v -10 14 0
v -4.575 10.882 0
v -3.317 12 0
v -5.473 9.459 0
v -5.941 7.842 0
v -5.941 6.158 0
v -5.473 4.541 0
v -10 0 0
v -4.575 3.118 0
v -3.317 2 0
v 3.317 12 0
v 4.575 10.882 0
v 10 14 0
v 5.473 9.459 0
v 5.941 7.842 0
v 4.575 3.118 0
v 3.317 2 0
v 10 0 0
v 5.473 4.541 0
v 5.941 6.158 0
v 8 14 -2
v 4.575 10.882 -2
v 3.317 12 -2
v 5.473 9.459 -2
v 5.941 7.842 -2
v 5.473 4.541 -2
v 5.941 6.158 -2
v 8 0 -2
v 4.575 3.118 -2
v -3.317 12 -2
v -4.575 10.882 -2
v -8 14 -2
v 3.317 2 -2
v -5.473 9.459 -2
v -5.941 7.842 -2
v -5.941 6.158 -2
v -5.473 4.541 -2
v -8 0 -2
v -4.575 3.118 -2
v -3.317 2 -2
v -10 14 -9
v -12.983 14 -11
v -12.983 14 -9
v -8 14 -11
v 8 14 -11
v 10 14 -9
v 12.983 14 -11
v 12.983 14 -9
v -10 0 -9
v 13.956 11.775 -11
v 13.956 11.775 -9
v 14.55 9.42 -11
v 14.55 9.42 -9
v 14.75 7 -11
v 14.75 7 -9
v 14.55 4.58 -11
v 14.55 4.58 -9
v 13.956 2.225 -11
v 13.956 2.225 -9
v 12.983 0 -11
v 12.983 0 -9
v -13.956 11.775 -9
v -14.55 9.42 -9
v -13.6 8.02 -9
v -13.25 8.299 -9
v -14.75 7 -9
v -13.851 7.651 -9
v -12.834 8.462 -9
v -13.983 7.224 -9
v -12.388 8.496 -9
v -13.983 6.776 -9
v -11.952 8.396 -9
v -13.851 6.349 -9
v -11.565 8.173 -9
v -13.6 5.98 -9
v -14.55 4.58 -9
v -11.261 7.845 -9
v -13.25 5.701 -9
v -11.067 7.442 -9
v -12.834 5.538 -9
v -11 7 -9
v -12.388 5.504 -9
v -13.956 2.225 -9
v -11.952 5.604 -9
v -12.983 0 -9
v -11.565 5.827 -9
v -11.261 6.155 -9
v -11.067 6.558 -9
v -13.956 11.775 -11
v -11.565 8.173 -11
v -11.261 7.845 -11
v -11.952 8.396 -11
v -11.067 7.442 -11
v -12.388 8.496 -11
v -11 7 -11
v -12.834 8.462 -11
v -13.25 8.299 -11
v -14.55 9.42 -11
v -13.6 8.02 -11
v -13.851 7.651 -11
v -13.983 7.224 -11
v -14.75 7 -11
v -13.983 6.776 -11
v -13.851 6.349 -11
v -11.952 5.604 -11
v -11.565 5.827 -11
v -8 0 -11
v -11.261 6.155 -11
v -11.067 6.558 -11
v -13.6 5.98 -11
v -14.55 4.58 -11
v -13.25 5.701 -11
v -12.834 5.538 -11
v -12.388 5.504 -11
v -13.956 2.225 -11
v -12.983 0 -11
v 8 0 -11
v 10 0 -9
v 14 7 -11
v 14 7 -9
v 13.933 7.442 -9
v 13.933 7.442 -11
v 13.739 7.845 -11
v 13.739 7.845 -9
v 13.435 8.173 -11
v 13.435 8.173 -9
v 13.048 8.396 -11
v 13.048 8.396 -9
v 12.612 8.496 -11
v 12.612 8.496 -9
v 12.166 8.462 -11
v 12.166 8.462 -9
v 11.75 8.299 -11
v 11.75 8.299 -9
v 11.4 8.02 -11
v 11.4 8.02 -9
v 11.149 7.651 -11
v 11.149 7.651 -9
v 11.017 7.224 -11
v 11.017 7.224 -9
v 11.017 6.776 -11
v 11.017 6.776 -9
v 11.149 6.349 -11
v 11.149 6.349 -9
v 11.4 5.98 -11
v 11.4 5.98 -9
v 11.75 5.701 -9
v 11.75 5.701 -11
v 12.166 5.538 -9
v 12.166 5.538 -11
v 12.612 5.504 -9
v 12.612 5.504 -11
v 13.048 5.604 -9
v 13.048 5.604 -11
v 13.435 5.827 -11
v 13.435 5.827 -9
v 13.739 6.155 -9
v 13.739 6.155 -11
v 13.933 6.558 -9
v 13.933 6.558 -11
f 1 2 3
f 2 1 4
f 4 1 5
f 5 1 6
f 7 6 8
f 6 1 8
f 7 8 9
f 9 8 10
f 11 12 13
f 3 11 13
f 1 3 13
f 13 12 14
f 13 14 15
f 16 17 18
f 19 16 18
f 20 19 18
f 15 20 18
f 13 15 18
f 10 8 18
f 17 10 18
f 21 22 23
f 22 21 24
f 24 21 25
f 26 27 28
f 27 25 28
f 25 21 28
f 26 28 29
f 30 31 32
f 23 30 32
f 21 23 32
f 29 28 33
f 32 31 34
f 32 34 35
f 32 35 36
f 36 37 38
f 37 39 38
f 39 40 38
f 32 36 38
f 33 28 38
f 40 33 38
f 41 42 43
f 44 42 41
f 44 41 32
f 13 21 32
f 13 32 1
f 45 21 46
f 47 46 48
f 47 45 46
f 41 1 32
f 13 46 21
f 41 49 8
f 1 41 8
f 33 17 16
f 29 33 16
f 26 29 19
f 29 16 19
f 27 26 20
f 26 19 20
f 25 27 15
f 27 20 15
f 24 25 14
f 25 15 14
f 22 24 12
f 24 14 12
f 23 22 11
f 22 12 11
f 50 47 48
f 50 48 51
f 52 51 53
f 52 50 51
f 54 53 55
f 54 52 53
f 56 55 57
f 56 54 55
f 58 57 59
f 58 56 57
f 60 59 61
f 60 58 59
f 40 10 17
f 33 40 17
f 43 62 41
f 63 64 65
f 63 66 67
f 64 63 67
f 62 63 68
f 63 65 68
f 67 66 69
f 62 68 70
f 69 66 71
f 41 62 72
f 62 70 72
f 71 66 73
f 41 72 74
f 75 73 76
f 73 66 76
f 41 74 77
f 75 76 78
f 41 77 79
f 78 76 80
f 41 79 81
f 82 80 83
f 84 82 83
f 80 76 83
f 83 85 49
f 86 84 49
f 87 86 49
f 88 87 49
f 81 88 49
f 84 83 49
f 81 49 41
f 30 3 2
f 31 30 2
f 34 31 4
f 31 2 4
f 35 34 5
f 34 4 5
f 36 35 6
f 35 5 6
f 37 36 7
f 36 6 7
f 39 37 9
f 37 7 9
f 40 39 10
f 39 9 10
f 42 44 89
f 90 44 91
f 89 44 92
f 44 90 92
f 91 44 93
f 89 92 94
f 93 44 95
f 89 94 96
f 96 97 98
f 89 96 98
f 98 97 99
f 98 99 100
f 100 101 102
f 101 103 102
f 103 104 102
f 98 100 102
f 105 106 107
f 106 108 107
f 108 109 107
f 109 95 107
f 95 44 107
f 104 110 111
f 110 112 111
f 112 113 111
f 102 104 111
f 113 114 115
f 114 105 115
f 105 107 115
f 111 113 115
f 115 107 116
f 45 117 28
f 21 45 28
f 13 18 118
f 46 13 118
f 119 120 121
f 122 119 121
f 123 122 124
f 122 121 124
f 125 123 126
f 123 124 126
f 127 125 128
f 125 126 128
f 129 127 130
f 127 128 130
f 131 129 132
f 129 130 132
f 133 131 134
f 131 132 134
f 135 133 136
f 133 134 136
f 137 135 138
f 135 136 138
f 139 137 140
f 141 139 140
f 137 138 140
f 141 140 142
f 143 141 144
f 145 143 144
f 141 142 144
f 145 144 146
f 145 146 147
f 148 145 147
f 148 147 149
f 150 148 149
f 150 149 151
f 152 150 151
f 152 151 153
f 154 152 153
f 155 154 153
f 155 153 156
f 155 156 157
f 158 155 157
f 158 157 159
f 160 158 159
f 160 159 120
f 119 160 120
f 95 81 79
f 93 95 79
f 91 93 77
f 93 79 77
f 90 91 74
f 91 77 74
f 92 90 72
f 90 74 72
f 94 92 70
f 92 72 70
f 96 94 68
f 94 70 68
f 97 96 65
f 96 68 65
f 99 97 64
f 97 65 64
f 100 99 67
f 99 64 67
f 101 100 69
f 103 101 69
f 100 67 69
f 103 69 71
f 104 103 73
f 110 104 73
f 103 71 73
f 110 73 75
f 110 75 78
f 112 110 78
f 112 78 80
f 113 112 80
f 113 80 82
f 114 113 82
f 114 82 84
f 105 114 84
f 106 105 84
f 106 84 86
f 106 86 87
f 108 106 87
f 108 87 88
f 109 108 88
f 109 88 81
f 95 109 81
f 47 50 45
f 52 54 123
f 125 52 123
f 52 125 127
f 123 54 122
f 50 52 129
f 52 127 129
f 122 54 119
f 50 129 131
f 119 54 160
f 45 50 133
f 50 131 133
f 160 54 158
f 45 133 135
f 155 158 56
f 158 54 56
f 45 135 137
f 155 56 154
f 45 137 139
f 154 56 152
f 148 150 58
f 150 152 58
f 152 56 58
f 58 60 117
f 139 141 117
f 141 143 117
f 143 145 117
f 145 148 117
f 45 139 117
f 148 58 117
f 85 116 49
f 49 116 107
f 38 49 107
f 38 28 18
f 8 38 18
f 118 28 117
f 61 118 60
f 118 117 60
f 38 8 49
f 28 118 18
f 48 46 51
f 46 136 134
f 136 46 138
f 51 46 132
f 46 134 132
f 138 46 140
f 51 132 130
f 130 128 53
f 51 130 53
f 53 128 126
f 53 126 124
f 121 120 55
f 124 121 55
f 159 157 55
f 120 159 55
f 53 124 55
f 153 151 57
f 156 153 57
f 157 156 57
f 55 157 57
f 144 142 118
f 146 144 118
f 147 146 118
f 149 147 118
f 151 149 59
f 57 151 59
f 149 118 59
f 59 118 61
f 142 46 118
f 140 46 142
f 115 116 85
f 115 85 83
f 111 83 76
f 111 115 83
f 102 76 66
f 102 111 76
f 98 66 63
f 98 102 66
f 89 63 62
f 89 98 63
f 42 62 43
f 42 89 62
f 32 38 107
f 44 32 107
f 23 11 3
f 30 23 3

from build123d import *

# Parameters (mm, degrees)
BOSS_EXTRUDE1_DEPTH = 14
SKETCH3_R           = 1.5
CUT_EXTRUDE1_DEPTH  = 14
CUT_EXTRUDE2_START  = -2
CUT_EXTRUDE2_DEPTH  = 2


# Read off the part's stored shape, not the designer's step: Cut-Extrude2
with BuildPart() as part:
    # Sketch2 → Boss-Extrude1 (new body)
    with BuildSketch(Plane(origin=(0, 0, 0), x_dir=(1, 0, 0), z_dir=(0, 1, 0))):
        Polygon((-10, 0), (10, 0), (10, 9), (15, 9), (15, 11), (8, 11), (8, 2), (-8, 2), (-8, 11), (-15, 11), (-15, 9), (-10, 9), align=None)
    extrude(amount=BOSS_EXTRUDE1_DEPTH)

    # Sketch3 → Cut-Extrude1 (cut)
    with BuildSketch(Plane.XY):
        with Locations((-12.5, 7)):
            Circle(SKETCH3_R)
        with Locations((12.5, 7)):
            Circle(SKETCH3_R)
        with BuildLine():
            Line((-3.31662479, 2), (3.31662479, 2))
            ThreePointArc((3.31662479, 2), (6, 7), (3.31662479, 12))
            Line((3.31662479, 12), (-3.31662479, 12))
            ThreePointArc((-3.31662479, 12), (-6, 7), (-3.31662479, 2))
        make_face()
    extrude(amount=-CUT_EXTRUDE1_DEPTH, mode=Mode.SUBTRACT)

    # Cut-Extrude2 outline → Cut-Extrude2 (cut)
    with BuildSketch(Plane.XY.offset(-9).offset(CUT_EXTRUDE2_START)):
        with BuildLine():
            ThreePointArc((-12.983162173, 0), (-14.75, 7), (-12.983162173, 14))
            Line((-12.983162173, 14), (-15, 14))
            Line((-15, 14), (-15, 0))
            Line((-15, 0), (-12.983162173, 0))
        make_face()
        with BuildLine():
            Line((15, 14), (12.983162173, 14))
            ThreePointArc((12.983162173, 14), (14.75, 7), (12.983162173, 0))
            Line((12.983162173, 0), (15, 0))
            Line((15, 0), (15, 14))
        make_face()
    extrude(amount=CUT_EXTRUDE2_DEPTH, mode=Mode.SUBTRACT)


solid = part.part
